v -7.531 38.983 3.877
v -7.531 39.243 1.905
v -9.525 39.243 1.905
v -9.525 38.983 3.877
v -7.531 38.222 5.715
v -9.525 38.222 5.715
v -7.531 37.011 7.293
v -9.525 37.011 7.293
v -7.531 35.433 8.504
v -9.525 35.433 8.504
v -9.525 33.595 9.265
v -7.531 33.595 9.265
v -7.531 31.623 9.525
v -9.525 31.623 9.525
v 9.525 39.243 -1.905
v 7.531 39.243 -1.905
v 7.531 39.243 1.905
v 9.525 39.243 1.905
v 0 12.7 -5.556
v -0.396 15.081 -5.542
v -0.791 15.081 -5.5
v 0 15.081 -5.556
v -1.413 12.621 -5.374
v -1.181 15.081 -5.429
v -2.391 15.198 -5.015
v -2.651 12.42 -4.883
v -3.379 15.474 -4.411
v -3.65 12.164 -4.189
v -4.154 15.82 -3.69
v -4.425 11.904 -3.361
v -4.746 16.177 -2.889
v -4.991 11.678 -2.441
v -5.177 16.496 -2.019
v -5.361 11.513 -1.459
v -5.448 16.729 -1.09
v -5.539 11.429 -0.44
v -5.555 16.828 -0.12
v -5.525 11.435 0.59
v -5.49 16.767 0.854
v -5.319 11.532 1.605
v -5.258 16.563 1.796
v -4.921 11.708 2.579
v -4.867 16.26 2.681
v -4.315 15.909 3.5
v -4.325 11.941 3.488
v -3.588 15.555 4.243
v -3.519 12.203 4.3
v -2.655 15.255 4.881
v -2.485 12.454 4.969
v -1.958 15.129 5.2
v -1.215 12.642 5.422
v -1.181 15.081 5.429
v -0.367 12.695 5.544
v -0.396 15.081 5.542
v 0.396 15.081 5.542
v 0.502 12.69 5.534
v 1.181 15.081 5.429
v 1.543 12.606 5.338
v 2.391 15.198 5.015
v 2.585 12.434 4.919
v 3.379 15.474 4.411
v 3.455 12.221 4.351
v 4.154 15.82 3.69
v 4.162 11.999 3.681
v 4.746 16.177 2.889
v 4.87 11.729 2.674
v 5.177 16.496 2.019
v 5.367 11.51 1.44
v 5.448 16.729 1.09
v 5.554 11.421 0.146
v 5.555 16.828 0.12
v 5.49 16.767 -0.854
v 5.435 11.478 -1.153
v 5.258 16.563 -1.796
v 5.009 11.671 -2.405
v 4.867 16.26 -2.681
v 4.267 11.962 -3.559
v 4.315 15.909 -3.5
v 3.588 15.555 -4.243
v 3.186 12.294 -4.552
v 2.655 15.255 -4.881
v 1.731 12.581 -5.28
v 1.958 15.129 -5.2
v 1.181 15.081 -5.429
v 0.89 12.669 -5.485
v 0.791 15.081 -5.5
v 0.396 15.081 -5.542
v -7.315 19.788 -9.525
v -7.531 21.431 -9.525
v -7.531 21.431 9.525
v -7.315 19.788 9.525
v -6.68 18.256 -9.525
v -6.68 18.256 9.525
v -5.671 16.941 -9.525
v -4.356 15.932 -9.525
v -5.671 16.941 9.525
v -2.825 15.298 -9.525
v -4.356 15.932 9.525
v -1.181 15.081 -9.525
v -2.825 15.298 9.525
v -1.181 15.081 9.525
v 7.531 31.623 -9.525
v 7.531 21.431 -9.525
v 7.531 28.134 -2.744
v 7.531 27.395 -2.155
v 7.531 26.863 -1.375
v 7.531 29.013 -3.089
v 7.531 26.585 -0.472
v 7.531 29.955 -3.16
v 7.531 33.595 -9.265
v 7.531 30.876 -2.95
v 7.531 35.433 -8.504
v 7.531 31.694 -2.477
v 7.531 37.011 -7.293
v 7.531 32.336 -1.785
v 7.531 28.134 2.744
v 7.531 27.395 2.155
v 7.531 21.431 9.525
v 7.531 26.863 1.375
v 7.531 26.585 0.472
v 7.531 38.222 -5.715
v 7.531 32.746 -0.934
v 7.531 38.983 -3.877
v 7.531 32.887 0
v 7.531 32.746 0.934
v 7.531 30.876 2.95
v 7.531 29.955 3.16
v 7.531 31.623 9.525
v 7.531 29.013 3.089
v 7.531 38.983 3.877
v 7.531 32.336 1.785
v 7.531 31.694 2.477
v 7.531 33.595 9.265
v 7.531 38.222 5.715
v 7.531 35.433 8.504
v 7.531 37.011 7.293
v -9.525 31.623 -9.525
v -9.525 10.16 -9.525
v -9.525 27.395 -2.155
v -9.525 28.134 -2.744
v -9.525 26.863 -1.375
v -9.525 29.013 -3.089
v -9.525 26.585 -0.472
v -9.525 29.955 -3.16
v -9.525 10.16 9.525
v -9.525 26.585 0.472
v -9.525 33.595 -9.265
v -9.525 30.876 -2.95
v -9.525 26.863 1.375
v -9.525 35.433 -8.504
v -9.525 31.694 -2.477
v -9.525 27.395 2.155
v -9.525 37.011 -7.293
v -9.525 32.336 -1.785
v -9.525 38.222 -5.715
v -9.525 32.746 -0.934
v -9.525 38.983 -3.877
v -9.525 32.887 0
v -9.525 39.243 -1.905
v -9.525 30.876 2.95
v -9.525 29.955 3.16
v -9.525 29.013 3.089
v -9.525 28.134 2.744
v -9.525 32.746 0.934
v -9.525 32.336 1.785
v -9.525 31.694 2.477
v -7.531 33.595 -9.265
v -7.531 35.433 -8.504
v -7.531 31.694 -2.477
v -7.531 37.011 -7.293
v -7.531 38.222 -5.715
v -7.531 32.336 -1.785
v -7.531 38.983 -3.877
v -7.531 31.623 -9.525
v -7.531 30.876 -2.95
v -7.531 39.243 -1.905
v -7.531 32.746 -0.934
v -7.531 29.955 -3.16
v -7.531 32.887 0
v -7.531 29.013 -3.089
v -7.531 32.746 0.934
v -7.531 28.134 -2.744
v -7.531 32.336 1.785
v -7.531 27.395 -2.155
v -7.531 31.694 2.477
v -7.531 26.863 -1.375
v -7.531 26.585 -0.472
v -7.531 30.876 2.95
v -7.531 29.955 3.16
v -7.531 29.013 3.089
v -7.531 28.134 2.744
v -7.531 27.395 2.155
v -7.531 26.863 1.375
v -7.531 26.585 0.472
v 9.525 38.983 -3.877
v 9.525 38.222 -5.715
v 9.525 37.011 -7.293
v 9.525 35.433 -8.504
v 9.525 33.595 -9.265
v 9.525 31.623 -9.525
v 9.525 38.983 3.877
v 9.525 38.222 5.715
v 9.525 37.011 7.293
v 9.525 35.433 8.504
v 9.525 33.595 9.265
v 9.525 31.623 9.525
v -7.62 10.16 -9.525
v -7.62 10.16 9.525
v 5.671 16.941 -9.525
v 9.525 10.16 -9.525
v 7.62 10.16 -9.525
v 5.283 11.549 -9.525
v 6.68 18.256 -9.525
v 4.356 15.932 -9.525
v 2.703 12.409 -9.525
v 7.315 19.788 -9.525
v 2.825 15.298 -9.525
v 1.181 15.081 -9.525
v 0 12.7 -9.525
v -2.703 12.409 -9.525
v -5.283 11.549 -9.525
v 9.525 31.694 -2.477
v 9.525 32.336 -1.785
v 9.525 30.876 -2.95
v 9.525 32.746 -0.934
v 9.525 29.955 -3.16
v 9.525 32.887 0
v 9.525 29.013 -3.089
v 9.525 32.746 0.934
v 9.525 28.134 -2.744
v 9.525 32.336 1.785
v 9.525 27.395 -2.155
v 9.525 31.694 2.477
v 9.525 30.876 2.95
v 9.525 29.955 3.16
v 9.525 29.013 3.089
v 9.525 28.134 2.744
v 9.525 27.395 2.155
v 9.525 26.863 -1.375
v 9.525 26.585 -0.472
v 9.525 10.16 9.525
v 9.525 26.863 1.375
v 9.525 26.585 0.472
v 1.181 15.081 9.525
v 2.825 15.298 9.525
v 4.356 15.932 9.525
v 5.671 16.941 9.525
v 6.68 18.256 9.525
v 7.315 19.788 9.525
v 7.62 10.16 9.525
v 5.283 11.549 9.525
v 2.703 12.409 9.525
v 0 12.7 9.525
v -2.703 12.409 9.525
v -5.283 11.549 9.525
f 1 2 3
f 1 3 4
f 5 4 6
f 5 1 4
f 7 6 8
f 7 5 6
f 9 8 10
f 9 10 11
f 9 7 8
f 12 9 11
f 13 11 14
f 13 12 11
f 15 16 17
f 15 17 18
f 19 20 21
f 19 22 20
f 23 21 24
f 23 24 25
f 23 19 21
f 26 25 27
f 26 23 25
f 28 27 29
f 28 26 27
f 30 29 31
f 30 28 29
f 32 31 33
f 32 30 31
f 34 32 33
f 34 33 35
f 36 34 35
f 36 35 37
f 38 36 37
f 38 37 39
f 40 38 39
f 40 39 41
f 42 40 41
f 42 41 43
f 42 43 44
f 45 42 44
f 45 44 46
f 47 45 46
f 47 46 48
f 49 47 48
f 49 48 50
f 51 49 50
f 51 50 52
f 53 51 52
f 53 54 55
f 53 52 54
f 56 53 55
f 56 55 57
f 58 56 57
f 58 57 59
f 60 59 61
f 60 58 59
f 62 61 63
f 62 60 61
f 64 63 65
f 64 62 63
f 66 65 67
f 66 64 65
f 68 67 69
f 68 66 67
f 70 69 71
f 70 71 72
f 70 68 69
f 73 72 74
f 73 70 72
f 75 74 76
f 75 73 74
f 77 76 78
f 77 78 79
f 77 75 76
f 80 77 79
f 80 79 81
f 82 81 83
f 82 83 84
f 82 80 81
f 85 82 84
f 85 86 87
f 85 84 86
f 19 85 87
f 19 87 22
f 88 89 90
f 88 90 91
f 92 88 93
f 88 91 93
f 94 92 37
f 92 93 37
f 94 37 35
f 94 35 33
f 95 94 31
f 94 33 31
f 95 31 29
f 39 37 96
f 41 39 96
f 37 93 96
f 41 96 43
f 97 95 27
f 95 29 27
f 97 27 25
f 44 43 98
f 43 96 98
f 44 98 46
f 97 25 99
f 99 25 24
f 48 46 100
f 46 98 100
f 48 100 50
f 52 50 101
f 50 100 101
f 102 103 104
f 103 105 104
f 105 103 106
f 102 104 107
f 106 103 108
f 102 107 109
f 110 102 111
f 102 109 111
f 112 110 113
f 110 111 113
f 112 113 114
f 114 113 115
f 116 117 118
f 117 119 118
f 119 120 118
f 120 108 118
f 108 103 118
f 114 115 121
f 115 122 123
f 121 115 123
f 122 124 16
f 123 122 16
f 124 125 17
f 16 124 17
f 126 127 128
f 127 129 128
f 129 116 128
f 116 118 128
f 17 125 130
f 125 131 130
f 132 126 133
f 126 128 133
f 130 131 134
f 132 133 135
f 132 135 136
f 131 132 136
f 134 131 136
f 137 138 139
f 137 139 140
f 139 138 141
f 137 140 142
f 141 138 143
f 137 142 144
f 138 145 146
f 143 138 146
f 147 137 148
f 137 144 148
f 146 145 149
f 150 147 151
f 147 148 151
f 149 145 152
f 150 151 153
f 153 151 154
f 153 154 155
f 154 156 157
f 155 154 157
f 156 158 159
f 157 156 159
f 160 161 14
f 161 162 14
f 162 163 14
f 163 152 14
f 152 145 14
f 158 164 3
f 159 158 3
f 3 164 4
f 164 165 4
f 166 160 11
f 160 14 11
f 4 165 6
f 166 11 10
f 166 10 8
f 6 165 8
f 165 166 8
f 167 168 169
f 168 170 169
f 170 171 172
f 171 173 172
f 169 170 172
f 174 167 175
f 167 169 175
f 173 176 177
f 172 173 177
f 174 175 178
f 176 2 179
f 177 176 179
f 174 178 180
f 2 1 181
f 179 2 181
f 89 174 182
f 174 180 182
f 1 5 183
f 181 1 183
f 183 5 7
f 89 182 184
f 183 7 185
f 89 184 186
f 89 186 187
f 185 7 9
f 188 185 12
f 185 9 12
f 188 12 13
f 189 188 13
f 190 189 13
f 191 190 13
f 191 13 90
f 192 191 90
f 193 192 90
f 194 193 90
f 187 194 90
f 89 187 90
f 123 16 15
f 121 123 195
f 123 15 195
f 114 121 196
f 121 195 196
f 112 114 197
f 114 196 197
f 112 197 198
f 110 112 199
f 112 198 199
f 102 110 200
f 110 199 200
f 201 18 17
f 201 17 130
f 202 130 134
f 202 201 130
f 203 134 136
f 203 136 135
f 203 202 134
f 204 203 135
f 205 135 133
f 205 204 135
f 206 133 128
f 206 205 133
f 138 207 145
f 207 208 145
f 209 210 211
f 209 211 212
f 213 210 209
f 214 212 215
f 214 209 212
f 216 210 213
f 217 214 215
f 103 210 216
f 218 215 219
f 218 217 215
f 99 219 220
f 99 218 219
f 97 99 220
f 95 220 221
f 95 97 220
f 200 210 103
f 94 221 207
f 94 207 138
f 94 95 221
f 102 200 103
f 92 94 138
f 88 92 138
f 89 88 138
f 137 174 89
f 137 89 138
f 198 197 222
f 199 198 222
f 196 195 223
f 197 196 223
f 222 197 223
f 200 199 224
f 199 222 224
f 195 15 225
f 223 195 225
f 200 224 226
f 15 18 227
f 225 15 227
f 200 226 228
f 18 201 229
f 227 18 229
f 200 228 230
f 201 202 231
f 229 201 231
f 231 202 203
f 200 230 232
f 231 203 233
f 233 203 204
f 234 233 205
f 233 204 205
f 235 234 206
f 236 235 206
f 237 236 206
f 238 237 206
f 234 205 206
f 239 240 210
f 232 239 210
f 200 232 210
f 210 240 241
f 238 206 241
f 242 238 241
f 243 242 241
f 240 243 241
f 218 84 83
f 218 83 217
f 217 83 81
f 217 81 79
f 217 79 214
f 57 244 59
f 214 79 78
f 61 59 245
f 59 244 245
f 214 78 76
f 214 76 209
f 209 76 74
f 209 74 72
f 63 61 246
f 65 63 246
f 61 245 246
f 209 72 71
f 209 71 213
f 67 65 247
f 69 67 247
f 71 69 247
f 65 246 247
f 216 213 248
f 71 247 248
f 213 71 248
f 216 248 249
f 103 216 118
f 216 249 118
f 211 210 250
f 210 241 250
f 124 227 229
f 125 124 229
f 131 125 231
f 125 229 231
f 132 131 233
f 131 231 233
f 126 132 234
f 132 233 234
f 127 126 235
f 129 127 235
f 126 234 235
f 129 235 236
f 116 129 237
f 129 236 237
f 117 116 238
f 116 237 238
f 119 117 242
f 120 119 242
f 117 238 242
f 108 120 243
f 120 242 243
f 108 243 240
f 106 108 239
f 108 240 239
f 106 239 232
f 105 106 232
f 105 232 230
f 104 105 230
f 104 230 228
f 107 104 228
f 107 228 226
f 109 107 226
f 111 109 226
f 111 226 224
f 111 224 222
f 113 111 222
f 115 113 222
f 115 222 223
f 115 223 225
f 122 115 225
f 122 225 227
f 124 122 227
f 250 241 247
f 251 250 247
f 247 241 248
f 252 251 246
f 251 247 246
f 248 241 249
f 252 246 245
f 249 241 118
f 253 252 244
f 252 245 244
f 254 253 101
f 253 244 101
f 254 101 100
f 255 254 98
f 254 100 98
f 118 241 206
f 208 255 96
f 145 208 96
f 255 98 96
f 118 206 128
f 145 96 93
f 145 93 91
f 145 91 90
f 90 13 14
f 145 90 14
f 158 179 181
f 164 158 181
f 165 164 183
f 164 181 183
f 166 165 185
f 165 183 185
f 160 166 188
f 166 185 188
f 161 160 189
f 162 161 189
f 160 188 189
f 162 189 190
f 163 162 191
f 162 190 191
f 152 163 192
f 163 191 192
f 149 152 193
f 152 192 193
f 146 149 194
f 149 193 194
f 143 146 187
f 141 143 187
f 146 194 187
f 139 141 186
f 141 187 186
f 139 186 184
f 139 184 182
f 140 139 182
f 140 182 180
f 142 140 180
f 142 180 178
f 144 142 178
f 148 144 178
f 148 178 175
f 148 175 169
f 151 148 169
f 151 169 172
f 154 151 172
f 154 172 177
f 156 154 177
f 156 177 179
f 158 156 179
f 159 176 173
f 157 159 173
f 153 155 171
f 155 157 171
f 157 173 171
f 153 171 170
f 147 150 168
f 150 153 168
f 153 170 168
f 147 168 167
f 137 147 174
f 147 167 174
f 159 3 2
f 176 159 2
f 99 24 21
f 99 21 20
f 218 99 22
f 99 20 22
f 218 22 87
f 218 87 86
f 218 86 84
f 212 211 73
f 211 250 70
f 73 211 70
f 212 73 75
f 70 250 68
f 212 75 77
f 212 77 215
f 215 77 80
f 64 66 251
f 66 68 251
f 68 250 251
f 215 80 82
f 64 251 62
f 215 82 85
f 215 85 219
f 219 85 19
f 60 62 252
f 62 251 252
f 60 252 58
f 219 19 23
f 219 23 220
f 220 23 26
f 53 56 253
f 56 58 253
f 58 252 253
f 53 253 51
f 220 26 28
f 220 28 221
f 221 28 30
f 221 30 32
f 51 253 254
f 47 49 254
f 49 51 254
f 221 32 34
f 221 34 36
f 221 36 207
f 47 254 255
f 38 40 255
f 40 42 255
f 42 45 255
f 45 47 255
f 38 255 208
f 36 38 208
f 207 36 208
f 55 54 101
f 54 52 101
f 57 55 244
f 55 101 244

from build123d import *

# Parameters (mm, degrees)
BOSS_EXTRUDE1_DEPTH     = 9.525
SKETCH2_R               = 3.16865
CUT_EXTRUDE1_DEPTH      = 45.650209115
CUT_EXTRUDE2_DEPTH      = 42.490532643
CUT_EXTRUDE2_DEPTH_BACK = 42.490532643
SKETCH3_R               = 5.55625


with BuildPart() as part:
    # Sketch1 → Boss-Extrude1 (new, symmetric)
    with BuildSketch(Plane.XY):
        with BuildLine():
            Line((7.5311, 39.243), (9.525, 39.243))
            Line((9.525, 39.243), (9.525, 10.16))
            Line((9.525, 10.16), (7.62, 10.16))
            ThreePointArc((7.62, 10.16), (0, 12.7), (-7.62, 10.16))
            Line((-7.62, 10.16), (-9.525, 10.16))
            Line((-9.525, 10.16), (-9.525, 39.243))
            Line((-9.525, 39.243), (-7.5311, 39.243))
            Line((-7.5311, 39.243), (-7.5311, 21.43125))
            ThreePointArc((-7.5311, 21.43125), (-5.671228061, 16.941121939), (-1.1811, 15.08125))
            Line((-1.1811, 15.08125), (1.1811, 15.08125))
            ThreePointArc((1.1811, 15.08125), (5.671228061, 16.941121939), (7.5311, 21.43125))
            Line((7.5311, 21.43125), (7.5311, 39.243))
        make_face()
    extrude(amount=BOSS_EXTRUDE1_DEPTH, both=True)

    # Sketch2 → Cut-Extrude1 (cut, through all)
    with BuildSketch(Plane(origin=(9.525, 0, 0), x_dir=(0, 0, -1), z_dir=(1, 0, 0))):
        with Locations((0, 29.718)):
            Circle(SKETCH2_R)
        with BuildLine():
            Line((-9.525, 31.623), (-9.525, 39.243))
            Line((-9.525, 39.243), (-1.905, 39.243))
            ThreePointArc((-1.905, 39.243), (-7.293153673, 37.011153673), (-9.525, 31.623))
        make_face()
        with BuildLine():
            Line((9.525, 31.623), (9.525, 39.243))
            Line((9.525, 39.243), (1.905, 39.243))
            ThreePointArc((1.905, 39.243), (7.293153673, 37.011153673), (9.525, 31.623))
        make_face()
    extrude(amount=-CUT_EXTRUDE1_DEPTH, mode=Mode.SUBTRACT)

    # Sketch3 → Cut-Extrude2 (cut, two sides: drawn at the far end of the back side and taken through both)
    with BuildSketch(Plane(origin=(0, 0, 0), x_dir=(1, 0, 0), z_dir=(0, 1, 0)).offset(-CUT_EXTRUDE2_DEPTH_BACK)):
        Circle(SKETCH3_R)
    extrude(amount=CUT_EXTRUDE2_DEPTH + CUT_EXTRUDE2_DEPTH_BACK, mode=Mode.SUBTRACT)


solid = part.part
